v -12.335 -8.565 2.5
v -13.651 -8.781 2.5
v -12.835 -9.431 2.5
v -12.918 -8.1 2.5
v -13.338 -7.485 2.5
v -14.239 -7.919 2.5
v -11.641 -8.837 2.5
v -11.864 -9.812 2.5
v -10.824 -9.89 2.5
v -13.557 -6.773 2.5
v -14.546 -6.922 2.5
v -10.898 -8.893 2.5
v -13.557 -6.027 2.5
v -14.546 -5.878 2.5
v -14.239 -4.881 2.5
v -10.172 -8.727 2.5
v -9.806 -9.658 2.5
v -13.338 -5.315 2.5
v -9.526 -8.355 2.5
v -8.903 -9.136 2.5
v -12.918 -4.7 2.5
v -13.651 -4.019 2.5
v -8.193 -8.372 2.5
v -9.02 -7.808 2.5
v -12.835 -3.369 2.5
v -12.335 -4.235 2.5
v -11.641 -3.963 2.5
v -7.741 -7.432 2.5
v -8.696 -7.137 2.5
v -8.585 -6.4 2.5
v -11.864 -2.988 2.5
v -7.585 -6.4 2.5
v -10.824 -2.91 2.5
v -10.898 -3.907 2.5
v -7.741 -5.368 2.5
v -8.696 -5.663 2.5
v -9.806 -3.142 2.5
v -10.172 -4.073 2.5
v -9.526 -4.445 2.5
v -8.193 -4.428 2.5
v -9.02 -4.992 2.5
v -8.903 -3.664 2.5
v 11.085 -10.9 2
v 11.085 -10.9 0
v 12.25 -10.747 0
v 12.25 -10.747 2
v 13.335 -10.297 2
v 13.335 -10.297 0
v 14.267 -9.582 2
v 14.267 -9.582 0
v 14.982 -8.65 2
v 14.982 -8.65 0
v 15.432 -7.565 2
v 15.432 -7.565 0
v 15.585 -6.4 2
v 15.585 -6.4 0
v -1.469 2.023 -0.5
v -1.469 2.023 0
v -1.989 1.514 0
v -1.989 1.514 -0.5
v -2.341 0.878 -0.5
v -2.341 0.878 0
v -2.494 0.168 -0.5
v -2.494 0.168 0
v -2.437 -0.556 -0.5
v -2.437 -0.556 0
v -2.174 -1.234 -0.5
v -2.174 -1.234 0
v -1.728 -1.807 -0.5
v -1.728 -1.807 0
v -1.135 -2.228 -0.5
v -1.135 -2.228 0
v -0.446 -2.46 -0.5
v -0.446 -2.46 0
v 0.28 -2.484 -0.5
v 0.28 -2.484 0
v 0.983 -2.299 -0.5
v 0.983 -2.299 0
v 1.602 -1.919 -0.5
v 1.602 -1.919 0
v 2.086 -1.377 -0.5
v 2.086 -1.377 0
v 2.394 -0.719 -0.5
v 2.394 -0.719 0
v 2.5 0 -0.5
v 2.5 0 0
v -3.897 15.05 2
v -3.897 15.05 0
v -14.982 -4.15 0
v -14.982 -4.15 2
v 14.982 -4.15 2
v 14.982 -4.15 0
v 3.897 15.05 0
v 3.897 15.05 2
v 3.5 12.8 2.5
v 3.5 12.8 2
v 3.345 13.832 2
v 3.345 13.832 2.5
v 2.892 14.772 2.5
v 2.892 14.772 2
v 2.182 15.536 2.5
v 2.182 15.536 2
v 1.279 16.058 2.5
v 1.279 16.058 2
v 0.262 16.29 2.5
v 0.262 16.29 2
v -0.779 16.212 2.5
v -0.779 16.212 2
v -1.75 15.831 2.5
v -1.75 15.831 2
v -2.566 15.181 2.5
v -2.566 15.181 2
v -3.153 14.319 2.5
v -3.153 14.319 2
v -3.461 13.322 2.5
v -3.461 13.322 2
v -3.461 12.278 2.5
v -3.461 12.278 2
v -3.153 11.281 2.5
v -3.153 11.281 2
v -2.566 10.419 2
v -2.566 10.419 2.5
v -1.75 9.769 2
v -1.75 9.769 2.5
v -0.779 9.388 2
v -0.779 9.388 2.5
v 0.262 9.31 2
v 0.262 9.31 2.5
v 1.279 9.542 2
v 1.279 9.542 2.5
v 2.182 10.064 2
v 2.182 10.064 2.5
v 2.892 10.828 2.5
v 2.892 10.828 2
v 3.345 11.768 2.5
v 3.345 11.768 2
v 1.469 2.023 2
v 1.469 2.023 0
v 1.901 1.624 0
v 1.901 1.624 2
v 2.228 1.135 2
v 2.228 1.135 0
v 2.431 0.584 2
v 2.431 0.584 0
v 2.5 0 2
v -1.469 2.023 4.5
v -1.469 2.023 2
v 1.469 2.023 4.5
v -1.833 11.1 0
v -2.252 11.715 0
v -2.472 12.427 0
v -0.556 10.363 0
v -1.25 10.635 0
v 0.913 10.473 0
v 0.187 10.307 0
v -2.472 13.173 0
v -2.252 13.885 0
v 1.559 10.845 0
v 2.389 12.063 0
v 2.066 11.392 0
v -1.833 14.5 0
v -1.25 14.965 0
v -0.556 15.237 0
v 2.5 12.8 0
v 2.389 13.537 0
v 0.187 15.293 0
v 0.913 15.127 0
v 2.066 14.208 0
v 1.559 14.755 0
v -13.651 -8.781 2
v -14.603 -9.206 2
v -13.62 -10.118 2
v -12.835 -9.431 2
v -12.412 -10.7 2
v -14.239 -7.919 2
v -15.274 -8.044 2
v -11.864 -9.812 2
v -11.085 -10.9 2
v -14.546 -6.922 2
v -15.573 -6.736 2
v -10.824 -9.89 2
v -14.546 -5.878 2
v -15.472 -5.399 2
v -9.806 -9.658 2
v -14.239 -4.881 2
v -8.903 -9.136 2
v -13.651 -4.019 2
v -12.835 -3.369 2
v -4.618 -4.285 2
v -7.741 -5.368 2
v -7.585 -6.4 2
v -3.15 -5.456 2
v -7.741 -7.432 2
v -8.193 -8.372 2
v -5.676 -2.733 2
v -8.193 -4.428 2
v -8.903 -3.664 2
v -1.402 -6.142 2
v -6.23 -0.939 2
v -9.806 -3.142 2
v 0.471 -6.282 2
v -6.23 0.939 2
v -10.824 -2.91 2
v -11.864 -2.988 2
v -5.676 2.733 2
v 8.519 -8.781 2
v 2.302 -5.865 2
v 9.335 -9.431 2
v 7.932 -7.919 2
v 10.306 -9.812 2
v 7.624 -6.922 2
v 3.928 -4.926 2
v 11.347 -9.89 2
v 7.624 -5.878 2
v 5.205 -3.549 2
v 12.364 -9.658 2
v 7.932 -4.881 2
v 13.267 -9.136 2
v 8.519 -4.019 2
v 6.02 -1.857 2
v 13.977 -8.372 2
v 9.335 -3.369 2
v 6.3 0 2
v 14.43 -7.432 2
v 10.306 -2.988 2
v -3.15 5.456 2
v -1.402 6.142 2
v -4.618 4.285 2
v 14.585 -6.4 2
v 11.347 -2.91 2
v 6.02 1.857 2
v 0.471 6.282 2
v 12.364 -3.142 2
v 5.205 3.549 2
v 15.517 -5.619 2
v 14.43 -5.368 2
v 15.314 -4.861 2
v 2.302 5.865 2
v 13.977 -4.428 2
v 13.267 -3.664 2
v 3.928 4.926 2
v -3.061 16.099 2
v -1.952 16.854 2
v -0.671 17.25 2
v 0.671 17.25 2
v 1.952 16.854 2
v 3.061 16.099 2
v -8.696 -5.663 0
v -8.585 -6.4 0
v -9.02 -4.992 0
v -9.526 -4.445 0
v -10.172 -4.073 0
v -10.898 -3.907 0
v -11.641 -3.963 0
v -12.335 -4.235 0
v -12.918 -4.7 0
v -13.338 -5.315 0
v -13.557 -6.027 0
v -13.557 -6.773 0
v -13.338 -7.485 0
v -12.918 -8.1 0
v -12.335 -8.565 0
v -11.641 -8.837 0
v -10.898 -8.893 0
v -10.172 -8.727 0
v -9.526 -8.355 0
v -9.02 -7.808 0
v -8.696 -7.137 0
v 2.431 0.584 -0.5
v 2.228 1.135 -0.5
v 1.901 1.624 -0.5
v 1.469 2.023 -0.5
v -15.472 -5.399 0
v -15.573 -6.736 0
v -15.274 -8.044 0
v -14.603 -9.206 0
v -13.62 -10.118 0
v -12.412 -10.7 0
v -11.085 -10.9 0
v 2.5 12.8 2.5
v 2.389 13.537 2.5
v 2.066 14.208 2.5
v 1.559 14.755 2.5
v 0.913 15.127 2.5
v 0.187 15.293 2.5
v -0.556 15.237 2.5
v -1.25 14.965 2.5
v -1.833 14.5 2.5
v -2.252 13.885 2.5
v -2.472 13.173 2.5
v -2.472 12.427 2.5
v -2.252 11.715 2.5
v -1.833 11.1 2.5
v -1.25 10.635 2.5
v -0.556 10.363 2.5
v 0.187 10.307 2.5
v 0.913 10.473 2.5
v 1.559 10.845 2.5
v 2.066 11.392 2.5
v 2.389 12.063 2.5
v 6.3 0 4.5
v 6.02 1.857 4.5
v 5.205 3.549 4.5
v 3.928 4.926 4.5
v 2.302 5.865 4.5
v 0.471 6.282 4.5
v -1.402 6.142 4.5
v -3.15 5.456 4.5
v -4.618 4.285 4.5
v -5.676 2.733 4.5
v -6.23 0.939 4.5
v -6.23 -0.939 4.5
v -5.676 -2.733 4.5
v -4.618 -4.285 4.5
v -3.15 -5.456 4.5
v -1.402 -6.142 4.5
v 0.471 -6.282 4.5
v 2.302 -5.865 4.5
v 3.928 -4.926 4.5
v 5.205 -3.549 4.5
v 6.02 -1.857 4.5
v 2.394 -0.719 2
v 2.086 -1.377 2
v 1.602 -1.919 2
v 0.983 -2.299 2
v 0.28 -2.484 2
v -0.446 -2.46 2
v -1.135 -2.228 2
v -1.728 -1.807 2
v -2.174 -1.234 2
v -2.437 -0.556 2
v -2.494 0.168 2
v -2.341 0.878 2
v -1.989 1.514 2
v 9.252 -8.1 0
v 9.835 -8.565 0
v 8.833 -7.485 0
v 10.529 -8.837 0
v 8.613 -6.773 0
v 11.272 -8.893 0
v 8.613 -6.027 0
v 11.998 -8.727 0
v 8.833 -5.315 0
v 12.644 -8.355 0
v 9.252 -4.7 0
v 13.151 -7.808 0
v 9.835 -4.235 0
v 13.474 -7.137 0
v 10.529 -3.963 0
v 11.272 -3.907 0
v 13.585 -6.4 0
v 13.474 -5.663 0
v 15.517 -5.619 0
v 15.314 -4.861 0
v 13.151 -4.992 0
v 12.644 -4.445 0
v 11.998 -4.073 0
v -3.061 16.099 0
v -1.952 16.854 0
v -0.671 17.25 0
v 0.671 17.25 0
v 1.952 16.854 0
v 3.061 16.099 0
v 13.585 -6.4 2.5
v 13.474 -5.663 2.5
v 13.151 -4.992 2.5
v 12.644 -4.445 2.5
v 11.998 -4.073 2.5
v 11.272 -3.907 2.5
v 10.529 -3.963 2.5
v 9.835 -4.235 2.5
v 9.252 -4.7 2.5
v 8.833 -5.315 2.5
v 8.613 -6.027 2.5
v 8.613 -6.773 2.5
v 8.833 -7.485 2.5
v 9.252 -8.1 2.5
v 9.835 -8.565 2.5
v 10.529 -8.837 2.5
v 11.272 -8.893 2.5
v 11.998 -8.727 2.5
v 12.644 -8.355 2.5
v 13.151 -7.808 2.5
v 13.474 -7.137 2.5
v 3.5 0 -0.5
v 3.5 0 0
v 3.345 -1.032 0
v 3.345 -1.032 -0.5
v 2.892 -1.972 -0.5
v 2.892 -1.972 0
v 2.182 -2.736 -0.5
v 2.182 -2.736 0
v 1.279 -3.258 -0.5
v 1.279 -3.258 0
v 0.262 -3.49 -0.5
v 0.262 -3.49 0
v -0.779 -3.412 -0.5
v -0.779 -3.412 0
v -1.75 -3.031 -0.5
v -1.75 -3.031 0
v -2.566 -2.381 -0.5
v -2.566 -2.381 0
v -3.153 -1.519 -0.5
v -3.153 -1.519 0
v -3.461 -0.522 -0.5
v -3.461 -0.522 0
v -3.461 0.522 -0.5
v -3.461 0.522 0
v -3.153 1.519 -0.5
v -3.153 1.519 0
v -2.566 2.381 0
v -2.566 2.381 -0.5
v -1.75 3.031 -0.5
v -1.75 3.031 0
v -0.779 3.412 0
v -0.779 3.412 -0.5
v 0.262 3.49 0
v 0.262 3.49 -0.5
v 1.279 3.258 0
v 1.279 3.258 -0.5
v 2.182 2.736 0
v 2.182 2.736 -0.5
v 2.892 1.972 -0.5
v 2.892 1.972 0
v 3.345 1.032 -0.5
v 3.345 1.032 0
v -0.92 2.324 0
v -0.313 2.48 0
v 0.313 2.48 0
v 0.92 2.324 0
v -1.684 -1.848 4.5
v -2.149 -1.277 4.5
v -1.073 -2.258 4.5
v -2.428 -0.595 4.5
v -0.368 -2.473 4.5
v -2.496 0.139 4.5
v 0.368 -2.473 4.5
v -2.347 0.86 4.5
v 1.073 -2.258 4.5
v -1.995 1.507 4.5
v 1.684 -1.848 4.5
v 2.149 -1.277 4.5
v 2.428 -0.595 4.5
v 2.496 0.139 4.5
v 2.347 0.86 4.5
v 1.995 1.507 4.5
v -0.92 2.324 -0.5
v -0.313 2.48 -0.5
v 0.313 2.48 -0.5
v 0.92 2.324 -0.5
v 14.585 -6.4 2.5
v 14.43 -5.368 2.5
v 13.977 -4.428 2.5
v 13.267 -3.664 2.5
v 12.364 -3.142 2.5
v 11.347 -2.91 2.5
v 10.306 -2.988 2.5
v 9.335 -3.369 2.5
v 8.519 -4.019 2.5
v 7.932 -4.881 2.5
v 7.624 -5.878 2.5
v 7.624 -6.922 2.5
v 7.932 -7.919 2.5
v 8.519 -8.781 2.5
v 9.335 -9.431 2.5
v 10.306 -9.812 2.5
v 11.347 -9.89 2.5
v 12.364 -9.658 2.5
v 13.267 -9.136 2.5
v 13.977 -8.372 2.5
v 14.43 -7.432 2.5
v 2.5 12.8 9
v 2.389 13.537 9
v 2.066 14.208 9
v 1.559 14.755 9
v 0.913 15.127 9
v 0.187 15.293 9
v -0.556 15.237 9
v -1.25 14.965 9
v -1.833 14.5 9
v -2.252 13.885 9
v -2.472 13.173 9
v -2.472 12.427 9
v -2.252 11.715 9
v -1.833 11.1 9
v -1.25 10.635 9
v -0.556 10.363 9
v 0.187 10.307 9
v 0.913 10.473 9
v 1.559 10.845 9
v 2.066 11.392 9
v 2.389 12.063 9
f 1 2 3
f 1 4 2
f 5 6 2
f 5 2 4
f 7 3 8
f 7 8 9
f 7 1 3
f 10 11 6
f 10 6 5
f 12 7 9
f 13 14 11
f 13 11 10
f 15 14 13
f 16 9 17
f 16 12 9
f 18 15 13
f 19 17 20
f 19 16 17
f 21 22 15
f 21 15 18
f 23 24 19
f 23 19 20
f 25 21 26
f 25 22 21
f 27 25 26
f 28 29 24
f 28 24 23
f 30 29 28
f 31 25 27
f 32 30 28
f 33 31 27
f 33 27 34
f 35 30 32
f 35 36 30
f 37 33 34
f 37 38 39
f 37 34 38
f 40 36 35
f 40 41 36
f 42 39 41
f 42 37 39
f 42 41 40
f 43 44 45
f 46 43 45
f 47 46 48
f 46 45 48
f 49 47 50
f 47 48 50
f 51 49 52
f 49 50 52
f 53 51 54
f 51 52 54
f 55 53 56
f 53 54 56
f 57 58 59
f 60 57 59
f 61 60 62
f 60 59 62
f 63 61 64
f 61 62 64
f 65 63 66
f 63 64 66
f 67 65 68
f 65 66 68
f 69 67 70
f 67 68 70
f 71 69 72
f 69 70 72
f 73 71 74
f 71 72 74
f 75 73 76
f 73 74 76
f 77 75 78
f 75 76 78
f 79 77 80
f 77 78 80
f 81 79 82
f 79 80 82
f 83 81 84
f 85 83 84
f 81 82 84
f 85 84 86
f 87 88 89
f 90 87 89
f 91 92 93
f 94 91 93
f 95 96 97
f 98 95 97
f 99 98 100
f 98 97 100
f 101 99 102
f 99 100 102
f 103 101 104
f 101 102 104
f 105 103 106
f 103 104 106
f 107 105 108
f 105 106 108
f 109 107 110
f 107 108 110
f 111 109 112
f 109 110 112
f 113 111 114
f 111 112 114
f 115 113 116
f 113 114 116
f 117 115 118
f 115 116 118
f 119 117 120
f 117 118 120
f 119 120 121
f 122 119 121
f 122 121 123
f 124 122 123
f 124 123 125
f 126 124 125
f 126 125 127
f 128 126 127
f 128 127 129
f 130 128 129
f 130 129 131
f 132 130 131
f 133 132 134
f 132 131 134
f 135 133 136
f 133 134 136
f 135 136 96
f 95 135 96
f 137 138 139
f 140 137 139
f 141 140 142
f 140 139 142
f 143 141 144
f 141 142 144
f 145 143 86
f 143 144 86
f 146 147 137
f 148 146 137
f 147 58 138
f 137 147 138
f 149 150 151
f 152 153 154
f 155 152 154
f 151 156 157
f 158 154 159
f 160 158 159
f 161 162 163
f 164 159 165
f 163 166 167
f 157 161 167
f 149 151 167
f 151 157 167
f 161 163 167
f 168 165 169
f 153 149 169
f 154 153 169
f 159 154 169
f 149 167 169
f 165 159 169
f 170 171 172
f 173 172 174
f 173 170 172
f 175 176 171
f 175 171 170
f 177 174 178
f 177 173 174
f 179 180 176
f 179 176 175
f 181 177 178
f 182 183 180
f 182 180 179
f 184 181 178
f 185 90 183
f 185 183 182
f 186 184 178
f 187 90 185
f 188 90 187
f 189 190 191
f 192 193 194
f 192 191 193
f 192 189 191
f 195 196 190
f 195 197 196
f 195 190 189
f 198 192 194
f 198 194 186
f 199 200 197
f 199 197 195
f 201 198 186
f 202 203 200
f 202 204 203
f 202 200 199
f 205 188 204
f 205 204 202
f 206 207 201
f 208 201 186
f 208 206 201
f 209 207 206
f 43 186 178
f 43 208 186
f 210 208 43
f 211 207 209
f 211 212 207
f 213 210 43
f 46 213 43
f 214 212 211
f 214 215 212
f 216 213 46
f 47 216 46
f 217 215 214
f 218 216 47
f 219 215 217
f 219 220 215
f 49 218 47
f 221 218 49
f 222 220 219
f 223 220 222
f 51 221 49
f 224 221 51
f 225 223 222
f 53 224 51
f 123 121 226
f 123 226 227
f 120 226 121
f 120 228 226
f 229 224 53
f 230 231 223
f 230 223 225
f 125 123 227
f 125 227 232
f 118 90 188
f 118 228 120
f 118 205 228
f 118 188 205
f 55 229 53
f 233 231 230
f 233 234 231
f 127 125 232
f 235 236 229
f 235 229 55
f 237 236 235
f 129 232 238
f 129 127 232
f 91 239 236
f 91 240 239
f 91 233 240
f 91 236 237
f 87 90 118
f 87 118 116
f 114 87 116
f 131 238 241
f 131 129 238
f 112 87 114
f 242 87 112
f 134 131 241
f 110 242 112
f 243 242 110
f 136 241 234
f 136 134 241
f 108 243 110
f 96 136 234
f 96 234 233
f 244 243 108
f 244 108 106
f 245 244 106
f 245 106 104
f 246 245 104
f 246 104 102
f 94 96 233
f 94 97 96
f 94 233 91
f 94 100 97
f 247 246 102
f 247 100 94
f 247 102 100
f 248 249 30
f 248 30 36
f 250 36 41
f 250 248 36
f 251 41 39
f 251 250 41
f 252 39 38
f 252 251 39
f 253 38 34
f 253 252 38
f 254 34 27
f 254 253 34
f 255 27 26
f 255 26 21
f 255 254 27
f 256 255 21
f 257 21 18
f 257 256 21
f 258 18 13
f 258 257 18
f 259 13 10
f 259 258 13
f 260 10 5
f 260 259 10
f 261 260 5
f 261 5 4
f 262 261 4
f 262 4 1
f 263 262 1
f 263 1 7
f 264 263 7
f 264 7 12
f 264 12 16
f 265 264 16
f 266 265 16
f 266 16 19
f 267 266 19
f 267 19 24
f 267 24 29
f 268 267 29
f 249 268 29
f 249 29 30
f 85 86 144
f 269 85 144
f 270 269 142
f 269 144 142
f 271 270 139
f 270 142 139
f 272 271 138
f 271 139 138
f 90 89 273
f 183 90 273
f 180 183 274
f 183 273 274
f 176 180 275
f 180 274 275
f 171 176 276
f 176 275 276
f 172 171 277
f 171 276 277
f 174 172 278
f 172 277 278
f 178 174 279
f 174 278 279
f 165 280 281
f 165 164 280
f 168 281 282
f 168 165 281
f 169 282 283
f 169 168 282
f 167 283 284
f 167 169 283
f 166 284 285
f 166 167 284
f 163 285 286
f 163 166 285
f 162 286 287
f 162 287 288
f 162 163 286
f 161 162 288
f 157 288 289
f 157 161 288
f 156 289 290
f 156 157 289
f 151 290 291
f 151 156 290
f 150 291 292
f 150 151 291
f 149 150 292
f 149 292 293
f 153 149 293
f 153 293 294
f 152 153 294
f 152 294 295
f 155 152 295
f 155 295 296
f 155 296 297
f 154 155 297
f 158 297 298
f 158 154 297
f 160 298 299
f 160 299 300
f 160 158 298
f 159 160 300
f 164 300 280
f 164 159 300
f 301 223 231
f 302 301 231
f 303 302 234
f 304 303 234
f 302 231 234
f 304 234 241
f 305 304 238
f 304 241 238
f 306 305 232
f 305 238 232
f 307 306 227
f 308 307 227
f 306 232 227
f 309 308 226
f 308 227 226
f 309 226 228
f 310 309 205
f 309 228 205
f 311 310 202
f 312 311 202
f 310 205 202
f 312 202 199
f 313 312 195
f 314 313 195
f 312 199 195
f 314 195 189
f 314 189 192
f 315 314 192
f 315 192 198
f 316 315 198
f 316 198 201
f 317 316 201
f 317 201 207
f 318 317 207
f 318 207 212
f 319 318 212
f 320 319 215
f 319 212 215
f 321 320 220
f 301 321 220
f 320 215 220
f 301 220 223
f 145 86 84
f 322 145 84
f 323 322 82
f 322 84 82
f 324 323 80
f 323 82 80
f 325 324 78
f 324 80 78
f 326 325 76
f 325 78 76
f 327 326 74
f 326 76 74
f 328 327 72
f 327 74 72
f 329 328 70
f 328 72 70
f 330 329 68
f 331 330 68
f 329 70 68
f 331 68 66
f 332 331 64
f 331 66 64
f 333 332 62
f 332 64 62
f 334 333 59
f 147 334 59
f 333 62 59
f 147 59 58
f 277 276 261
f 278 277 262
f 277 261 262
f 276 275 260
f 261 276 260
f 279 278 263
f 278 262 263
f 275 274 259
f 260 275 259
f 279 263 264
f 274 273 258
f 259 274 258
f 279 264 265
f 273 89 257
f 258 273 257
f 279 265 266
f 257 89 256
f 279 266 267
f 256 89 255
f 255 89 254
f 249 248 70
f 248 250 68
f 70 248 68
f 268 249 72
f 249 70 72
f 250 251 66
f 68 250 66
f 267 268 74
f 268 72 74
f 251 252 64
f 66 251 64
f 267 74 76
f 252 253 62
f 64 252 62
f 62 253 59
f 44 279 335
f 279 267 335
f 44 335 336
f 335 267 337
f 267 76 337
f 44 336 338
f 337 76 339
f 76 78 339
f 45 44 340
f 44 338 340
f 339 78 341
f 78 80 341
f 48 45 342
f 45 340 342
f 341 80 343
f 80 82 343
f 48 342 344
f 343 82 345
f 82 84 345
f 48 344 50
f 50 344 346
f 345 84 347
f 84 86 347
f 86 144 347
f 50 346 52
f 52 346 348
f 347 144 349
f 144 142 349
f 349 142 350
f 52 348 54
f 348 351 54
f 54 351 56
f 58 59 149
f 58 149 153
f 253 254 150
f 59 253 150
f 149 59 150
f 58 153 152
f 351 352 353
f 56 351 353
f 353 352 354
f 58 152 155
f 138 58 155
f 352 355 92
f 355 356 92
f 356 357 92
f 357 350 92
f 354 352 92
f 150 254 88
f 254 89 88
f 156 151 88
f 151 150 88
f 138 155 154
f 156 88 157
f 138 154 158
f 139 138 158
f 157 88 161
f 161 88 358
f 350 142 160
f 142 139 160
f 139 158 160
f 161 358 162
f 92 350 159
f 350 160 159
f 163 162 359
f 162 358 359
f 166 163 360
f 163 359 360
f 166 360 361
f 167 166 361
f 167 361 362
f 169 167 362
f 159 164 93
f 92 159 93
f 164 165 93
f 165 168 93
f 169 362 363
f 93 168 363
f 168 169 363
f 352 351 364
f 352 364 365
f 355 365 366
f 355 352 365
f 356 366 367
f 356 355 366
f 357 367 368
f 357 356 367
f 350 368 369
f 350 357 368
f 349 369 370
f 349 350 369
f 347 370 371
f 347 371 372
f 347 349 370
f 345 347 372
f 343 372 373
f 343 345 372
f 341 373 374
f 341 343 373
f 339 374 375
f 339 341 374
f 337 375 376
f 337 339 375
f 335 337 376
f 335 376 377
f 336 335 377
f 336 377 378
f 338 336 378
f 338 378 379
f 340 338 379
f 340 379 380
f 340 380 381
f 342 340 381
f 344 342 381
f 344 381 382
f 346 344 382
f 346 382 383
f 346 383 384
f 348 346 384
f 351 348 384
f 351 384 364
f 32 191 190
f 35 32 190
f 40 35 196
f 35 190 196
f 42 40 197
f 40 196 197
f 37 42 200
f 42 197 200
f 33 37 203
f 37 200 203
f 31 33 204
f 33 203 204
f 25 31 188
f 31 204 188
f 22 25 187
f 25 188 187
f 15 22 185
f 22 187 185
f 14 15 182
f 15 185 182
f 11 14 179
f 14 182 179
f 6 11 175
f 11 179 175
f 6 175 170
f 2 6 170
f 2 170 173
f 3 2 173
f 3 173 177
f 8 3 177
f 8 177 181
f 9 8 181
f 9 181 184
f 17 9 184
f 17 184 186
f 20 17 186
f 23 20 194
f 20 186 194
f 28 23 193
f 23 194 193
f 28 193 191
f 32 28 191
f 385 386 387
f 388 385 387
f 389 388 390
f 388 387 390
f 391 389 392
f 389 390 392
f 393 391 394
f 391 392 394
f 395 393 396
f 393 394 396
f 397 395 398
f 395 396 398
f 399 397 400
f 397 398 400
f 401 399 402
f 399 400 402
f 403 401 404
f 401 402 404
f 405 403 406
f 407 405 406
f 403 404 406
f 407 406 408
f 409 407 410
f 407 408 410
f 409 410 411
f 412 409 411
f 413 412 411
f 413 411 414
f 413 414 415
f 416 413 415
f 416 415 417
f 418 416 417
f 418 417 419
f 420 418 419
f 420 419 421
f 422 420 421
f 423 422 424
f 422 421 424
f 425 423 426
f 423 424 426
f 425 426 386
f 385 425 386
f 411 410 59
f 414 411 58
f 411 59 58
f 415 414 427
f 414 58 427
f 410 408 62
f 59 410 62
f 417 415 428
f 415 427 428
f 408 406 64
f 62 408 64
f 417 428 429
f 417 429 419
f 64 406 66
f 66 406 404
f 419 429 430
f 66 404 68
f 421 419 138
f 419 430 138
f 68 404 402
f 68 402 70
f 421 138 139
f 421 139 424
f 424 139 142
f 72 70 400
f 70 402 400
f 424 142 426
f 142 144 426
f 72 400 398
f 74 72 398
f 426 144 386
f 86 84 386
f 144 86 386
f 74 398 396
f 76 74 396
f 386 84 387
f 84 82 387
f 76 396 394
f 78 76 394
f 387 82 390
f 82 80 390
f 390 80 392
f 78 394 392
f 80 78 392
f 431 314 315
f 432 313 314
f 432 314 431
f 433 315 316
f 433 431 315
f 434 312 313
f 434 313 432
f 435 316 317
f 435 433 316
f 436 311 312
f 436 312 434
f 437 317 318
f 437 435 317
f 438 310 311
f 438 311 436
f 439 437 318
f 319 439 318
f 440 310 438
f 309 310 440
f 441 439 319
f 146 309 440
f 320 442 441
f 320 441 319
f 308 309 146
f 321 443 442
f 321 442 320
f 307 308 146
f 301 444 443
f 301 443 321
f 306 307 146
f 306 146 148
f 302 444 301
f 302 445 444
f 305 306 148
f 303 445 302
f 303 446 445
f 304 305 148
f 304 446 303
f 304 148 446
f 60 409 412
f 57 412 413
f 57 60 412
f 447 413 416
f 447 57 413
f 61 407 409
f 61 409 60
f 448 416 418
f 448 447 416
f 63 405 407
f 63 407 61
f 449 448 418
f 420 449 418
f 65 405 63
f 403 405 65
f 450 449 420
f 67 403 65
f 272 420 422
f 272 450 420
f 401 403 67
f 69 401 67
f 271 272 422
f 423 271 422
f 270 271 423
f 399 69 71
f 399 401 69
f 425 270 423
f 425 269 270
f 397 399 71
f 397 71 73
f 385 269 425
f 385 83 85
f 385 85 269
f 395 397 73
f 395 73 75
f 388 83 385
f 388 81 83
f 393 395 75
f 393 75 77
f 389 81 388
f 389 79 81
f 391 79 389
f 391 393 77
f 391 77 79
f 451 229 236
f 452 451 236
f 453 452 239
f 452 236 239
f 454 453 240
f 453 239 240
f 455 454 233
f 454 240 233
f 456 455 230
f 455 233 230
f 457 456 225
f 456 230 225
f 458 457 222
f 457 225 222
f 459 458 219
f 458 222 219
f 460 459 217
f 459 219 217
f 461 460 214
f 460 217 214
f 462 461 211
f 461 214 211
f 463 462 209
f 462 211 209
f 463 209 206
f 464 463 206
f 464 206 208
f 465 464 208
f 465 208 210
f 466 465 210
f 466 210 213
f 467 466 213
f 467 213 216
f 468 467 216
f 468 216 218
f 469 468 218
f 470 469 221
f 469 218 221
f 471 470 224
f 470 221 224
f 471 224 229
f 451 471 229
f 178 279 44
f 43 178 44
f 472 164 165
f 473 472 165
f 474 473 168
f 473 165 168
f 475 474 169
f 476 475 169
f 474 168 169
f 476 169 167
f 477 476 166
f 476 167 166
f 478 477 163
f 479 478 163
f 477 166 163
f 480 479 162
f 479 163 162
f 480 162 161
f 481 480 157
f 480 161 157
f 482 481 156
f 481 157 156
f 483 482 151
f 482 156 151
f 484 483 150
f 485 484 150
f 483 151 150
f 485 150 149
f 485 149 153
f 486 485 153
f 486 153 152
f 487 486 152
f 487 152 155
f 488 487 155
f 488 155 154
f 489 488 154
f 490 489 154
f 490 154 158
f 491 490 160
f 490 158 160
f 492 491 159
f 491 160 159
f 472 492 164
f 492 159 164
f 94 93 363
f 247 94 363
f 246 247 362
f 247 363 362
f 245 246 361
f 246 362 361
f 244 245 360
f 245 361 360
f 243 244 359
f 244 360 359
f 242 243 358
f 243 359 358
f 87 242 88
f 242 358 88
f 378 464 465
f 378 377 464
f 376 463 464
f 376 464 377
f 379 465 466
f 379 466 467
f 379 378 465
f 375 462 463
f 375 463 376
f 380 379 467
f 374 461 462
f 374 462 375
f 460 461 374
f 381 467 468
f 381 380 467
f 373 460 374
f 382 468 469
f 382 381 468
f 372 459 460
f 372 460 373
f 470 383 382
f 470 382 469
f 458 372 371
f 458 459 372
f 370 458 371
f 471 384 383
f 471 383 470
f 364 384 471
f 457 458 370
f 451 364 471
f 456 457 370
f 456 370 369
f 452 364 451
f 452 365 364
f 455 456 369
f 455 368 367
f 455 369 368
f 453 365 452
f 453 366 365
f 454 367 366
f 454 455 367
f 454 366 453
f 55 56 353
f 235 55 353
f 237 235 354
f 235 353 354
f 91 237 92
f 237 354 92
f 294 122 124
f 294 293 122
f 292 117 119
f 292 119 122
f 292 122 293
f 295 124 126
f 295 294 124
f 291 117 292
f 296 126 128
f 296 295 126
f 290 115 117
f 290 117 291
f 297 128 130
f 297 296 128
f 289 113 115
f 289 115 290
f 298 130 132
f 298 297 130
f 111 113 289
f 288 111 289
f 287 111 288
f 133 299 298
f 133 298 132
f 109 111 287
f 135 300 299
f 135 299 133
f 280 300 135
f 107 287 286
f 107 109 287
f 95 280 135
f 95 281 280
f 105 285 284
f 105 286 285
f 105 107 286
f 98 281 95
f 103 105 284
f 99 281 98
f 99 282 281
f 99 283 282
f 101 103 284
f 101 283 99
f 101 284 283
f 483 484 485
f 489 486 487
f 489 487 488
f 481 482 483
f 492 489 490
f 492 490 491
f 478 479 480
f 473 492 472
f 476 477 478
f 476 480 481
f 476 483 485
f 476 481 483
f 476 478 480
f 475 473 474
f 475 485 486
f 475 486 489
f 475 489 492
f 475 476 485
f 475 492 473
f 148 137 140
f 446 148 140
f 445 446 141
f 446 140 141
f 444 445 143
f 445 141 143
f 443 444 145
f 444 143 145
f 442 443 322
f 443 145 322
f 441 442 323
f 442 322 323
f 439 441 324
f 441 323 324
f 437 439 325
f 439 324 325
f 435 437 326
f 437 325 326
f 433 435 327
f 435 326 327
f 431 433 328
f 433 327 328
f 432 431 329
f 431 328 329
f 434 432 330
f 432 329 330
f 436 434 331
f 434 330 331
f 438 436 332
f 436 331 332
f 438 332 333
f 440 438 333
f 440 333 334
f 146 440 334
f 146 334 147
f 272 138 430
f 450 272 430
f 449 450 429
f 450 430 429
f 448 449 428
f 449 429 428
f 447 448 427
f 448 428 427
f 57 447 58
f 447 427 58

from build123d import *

# Parameters (mm, degrees)
F0_R     = 6.3000004034
F0_R_2   = 2.5
F1_DEPTH = 2
F2_R     = 6.3000004034
F3_DEPTH = 2.5
F4_R     = 3.5
F5_DEPTH = 0.5
F2_R_2   = 3.5
F2_R_3   = 2.5
F6_DEPTH = 0.5
F7_DEPTH = 9


# Not quite as in the source:
# - a feature names something its author has since deleted; it is built from what else it names


with BuildPart() as f1:
    # F0 (on Top) → F1 (new body)
    with BuildSketch(Plane.XY):
        with BuildLine():
            ThreePointArc((-14.9822403618, -4.1499987392), (-9.9204403472, -2.0533328369), (-6.5851262035, -6.3999990141))
            ThreePointArc((-6.5851262035, -6.3999990141), (-7.9031458296, -9.581979671), (-11.0851266037, -10.8999990141))
            Line((-11.0851266037, -10.8999990141), (11.0851230607, -10.9000009859))
            ThreePointArc((11.0851230607, -10.9000009859), (7.1880073569, -4.1499981658), (14.9822391266, -4.1499974067))
            Line((14.9822391266, -4.1499974067), (3.8971112321, 15.0500002429))
            ThreePointArc((3.8971112321, 15.0500002429), (4.3466632431, 13.9646860482), (4.4999970644, 12.8000004034))
            ThreePointArc((4.4999970644, 12.8000004034), (-1.1646868227, 8.4533357372), (-3.8971141748, 15.0499998963))
            Line((-3.8971141748, 15.0499998963), (-14.9822403618, -4.1499987392))
        make_face()
        Circle(F0_R, mode=Mode.SUBTRACT)
        Circle(F0_R)
        with BuildLine():
            ThreePointArc((1.4694631307, 2.0225424859), (2.2275163105, 1.1349762493), (2.5, 0))
            ThreePointArc((2.5, 0), (-1.1349762493, -2.2275163105), (-1.4694631307, 2.0225424859))
            ThreePointArc((-1.4694631307, 2.0225424859), (0, 2.5), (1.4694631307, 2.0225424859))
        make_face(mode=Mode.SUBTRACT)
        with BuildLine():
            ThreePointArc((14.9822391266, -4.1499974067), (7.1880073569, -4.1499981658), (11.0851230607, -10.9000009859))
            ThreePointArc((11.0851230607, -10.9000009859), (14.2671052289, -9.5819810652), (15.5851254326, -6.3999990141))
            ThreePointArc((15.5851254326, -6.3999990141), (15.4317914908, -5.2353124542), (14.9822391266, -4.1499974067))
        make_face()
        with Locations((11.0851234609, -6.3999990141)):
            Circle(F0_R_2, mode=Mode.SUBTRACT)
        with BuildLine():
            ThreePointArc((-11.0851266037, -10.8999990141), (-7.9031458296, -9.581979671), (-6.5851262035, -6.3999990141))
            ThreePointArc((-6.5851262035, -6.3999990141), (-9.9204403472, -2.0533328369), (-14.9822403618, -4.1499987392))
            ThreePointArc((-14.9822403618, -4.1499987392), (-14.9822406999, -8.6499987034), (-11.0851266037, -10.8999990141))
        make_face()
        with Locations((-11.0851262035, -6.3999990141)):
            Circle(F0_R_2, mode=Mode.SUBTRACT)
        with BuildLine():
            ThreePointArc((3.8971112321, 15.0500002429), (-1.5714e-06, 17.2999988391), (-3.8971141748, 15.0499998963))
            ThreePointArc((-3.8971141748, 15.0499998963), (-1.1646868227, 8.4533357372), (4.4999970644, 12.8000004034))
            ThreePointArc((4.4999970644, 12.8000004034), (4.3466632431, 13.9646860482), (3.8971112321, 15.0500002429))
        make_face()
        with Locations((-1.3713e-06, 12.8000004034)):
            Circle(F0_R_2, mode=Mode.SUBTRACT)
        with BuildLine():
            Line((-1.4694631307, 2.0225424859), (1.4694631307, 2.0225424859))
            ThreePointArc((1.4694631307, 2.0225424859), (0, 2.5), (-1.4694631307, 2.0225424859))
        make_face()
    extrude(amount=F1_DEPTH)

    # F2 (on face) → F3 (join)
    with BuildSketch(Plane.XY.offset(2)):
        Circle(F2_R)
        with BuildLine():
            Line((-1.4694631307, 2.0225424859), (1.4694631307, 2.0225424859))
            ThreePointArc((1.4694631307, 2.0225424859), (0, -2.5), (-1.4694631307, 2.0225424859))
        make_face(mode=Mode.SUBTRACT)
    extrude(amount=F3_DEPTH)

    # F2 (on face) → F6 (join)
    with BuildSketch(Plane.XY.offset(2)):
        with Locations((-1.3713e-06, 12.8000004034)):
            Circle(F2_R_2)
        with Locations((-1.3713e-06, 12.8000004034)):
            Circle(F2_R_3, mode=Mode.SUBTRACT)
        with Locations((-11.0851262035, -6.3999990141)):
            Circle(F2_R_2)
        with Locations((-11.0851262035, -6.3999990141)):
            Circle(F2_R_3, mode=Mode.SUBTRACT)
        with Locations((11.0851234609, -6.3999990141)):
            Circle(F2_R_2)
        with Locations((11.0851234609, -6.3999990141)):
            Circle(F2_R_3, mode=Mode.SUBTRACT)
    extrude(amount=F6_DEPTH)


with BuildPart() as f5:
    # F4 (on face) → F5 (new body)
    with BuildSketch(Plane(origin=(0, 0, 0), x_dir=(1, 0, 0), z_dir=(0, 0, -1))):
        Circle(F4_R)
        with BuildLine():
            ThreePointArc((-1.4694631307, -2.0225424859), (-1.1349762493, 2.2275163105), (2.5, 0))
            ThreePointArc((2.5, 0), (2.2275163105, -1.1349762493), (1.4694631307, -2.0225424859))
            ThreePointArc((1.4694631307, -2.0225424859), (0, -2.5), (-1.4694631307, -2.0225424859))
        make_face(mode=Mode.SUBTRACT)
    extrude(amount=F5_DEPTH)


with BuildPart() as f7:
    # F0 (on Top) → F7 (new body)
    with BuildSketch(Plane.XY):
        with Locations((-1.3713e-06, 12.8000004034)):
            Circle(F0_R_2)
    extrude(amount=F7_DEPTH)


solid = Compound([f1.part, f5.part, f7.part])
